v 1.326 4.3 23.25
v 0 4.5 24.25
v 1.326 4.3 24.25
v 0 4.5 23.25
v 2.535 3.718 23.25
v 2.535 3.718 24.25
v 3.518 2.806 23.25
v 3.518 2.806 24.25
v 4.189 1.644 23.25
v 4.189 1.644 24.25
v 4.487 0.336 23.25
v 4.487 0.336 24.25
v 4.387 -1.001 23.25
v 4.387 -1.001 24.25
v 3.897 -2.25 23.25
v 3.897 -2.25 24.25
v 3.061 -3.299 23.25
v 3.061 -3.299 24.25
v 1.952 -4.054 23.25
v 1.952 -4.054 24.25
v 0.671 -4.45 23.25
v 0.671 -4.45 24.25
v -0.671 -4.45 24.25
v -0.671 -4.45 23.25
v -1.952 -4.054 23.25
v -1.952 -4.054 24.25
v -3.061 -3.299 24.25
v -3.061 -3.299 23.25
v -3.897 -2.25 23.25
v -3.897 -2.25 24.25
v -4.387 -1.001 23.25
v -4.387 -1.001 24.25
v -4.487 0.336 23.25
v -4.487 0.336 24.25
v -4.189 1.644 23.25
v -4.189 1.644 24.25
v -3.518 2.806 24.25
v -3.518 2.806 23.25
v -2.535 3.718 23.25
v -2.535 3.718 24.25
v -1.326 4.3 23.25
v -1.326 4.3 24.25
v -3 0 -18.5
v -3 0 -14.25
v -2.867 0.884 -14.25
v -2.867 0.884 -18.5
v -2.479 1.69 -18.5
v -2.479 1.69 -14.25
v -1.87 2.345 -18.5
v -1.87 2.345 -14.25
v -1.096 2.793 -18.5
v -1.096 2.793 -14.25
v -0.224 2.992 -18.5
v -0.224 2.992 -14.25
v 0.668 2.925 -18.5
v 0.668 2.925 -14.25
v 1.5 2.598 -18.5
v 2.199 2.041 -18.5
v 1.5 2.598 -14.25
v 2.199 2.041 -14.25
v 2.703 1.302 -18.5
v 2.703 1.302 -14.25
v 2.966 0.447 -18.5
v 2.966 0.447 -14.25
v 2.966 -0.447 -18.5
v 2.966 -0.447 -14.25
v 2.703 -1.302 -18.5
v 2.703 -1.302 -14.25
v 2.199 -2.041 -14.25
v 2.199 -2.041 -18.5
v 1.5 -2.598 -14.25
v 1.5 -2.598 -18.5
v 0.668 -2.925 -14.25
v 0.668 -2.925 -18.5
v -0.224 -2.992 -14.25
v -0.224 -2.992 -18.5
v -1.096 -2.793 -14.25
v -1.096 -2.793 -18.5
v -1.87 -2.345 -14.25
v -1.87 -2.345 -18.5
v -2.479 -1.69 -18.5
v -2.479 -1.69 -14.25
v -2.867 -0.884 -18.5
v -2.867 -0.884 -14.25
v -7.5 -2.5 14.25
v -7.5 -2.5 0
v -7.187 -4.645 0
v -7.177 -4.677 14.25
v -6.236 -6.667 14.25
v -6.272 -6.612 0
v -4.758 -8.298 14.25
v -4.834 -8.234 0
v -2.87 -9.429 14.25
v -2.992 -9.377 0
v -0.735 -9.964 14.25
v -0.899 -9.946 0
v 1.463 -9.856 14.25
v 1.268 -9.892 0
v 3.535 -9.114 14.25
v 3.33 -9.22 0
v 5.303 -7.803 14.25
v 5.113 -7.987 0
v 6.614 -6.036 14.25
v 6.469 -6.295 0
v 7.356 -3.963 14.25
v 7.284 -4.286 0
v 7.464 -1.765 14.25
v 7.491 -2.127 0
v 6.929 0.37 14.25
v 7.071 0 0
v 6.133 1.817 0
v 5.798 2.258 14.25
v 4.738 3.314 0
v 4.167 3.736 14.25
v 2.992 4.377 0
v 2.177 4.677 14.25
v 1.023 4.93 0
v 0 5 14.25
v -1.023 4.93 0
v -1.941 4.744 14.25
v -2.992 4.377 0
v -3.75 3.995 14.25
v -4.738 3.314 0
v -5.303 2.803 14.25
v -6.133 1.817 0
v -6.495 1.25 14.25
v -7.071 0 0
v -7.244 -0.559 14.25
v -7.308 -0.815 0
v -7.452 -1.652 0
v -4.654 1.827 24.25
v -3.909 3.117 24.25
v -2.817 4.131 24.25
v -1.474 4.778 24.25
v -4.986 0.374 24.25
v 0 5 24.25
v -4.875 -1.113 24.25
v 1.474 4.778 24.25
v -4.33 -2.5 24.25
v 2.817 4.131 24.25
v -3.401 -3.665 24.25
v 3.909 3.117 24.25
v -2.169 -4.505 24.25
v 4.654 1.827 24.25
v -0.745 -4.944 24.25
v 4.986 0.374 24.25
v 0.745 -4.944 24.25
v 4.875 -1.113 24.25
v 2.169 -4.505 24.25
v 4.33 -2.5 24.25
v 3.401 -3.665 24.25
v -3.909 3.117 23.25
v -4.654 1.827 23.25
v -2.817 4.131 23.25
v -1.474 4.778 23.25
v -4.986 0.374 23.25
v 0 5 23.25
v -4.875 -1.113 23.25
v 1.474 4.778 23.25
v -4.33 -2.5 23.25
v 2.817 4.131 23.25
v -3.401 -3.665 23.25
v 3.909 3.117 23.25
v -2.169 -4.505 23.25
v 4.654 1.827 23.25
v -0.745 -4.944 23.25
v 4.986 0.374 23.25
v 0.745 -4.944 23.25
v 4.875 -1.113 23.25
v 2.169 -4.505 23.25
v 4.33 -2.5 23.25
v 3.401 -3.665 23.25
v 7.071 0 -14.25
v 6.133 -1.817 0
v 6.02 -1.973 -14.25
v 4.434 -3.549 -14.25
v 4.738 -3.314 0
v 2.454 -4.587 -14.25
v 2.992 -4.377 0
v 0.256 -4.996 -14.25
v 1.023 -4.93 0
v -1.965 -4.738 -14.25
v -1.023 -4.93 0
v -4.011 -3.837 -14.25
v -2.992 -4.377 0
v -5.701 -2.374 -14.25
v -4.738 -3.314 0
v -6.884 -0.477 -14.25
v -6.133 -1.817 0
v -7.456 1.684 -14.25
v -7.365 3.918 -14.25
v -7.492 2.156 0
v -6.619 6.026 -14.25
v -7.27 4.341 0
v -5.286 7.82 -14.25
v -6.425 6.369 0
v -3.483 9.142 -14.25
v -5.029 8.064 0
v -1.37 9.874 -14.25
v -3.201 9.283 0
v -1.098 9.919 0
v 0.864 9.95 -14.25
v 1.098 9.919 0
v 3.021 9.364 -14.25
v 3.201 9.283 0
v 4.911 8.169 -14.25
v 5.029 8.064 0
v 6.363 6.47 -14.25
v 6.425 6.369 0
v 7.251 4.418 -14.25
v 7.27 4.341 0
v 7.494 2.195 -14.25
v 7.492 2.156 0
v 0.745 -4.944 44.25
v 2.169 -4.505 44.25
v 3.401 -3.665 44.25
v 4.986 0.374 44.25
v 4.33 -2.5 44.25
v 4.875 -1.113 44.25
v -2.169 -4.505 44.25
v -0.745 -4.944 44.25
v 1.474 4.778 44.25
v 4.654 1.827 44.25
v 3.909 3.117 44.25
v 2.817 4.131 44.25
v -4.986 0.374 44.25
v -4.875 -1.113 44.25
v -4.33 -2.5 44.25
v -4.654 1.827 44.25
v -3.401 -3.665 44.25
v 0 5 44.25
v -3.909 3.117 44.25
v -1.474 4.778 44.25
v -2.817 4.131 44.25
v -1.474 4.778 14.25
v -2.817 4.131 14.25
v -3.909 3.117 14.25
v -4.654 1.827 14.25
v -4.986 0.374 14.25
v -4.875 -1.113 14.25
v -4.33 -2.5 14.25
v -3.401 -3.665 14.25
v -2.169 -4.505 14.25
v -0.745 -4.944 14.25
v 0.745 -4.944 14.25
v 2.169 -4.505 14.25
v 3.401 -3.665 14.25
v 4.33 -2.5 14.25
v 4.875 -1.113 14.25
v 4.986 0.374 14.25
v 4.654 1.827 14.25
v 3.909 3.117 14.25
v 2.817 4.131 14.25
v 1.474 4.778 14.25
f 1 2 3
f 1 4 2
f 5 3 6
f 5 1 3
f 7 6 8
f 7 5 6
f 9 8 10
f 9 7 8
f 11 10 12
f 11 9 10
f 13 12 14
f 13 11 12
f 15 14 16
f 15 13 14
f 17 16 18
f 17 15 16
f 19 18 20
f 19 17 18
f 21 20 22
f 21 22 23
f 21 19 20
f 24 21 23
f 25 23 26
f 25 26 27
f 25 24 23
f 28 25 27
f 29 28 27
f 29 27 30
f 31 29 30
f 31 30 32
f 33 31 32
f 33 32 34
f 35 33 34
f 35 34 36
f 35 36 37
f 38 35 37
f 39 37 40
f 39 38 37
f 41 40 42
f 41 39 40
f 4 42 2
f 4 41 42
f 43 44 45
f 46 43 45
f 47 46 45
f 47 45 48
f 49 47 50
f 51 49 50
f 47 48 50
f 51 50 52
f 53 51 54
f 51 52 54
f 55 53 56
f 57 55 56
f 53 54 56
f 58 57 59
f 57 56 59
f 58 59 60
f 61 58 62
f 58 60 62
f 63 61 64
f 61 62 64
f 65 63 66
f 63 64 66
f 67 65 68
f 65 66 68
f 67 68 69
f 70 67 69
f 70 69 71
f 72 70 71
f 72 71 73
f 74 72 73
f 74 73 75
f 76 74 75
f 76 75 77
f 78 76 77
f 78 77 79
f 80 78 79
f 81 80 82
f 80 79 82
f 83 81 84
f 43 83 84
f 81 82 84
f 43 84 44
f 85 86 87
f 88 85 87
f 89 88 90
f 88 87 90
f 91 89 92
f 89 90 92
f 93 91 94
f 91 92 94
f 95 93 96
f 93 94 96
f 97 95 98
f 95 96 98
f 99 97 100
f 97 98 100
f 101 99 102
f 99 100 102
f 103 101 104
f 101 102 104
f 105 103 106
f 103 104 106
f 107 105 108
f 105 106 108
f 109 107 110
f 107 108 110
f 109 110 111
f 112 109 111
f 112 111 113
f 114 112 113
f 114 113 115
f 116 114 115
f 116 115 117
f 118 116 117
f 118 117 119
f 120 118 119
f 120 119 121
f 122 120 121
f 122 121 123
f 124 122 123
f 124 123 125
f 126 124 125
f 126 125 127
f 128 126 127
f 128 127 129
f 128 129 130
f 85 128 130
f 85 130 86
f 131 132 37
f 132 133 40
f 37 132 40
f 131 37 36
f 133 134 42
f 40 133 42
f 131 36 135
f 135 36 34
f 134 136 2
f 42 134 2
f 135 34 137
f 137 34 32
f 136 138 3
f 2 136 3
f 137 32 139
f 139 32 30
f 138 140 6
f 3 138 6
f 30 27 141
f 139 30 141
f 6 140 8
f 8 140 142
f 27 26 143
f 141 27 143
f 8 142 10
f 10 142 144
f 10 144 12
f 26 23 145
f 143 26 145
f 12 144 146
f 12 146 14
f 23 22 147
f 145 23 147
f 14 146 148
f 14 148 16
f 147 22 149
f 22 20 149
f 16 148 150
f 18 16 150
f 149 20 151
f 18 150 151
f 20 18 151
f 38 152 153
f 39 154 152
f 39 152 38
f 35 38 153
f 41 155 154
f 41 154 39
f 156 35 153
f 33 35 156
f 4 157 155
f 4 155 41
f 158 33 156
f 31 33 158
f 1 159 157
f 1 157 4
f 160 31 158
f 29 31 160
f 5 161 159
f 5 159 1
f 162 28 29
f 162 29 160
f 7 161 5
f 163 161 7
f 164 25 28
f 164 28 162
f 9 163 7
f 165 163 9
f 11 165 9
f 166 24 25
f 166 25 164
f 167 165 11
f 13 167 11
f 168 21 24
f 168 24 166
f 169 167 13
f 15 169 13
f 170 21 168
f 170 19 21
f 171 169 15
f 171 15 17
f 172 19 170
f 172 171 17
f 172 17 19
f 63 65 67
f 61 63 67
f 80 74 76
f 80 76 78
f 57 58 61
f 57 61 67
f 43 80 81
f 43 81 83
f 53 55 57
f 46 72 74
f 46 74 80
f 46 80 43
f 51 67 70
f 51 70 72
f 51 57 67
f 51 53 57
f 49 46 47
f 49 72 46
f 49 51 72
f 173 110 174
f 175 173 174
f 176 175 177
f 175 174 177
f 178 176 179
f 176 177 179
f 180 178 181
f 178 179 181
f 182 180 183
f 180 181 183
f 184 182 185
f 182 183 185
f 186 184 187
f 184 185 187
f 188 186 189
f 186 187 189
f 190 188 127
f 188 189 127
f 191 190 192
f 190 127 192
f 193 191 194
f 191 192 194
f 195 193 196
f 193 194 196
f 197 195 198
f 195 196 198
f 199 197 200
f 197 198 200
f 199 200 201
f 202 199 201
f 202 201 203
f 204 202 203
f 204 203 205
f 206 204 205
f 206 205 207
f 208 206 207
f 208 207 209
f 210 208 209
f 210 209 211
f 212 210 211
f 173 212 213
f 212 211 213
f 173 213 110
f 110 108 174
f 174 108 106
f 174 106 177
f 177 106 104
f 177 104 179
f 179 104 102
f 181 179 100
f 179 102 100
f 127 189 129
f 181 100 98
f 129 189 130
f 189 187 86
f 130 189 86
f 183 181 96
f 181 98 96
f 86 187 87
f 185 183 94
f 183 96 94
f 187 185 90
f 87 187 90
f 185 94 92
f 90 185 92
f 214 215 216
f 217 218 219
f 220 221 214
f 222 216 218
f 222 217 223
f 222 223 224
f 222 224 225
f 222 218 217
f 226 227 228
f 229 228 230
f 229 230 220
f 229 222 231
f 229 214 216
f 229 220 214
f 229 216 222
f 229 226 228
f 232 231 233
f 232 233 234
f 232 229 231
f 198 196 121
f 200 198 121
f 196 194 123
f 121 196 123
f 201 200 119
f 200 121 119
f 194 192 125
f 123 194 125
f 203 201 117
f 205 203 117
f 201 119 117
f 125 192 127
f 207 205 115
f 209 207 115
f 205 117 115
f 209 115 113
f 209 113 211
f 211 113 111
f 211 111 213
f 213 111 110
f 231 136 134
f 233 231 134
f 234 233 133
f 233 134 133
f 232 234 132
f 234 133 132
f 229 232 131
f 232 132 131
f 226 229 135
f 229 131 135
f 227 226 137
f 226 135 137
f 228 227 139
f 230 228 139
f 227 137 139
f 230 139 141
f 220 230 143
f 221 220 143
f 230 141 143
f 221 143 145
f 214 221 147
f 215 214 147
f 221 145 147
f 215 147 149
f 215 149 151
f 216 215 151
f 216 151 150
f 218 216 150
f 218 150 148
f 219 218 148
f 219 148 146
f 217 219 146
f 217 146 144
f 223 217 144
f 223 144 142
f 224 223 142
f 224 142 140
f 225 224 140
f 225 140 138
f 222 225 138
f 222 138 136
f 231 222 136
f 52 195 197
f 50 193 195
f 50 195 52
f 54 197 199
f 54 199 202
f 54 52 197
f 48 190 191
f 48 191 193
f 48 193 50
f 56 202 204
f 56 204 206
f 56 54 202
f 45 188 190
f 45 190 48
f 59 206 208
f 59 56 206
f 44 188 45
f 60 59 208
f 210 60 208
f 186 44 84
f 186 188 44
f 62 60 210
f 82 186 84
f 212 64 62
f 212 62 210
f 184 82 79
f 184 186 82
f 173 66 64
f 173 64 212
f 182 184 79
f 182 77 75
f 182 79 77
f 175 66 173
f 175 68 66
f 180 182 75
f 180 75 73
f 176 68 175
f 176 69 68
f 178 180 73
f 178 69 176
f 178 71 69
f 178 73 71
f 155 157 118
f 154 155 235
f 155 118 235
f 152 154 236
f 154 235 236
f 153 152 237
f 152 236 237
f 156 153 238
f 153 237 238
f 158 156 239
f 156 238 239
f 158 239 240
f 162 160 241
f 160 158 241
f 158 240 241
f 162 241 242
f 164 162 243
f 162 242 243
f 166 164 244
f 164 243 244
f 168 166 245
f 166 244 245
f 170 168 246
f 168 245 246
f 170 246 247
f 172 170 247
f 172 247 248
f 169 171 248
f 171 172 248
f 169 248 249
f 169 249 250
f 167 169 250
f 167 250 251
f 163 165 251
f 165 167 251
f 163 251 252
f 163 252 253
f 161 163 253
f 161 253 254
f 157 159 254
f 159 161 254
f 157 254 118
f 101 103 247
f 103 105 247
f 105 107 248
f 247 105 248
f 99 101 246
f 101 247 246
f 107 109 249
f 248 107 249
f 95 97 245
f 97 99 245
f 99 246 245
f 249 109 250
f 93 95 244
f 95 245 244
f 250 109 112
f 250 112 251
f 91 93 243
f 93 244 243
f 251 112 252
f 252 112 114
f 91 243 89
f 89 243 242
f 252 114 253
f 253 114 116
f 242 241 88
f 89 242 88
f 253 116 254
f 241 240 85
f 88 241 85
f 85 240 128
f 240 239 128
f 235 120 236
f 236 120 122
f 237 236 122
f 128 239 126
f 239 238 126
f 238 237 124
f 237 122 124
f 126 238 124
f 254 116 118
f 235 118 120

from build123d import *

# Parameters (mm, degrees)
SKETCH1_R           = 7.5
BOSS_EXTRUDE1_DEPTH = 14.25
SKETCH2_R           = 7.5
BOSS_EXTRUDE2_DEPTH = 14.25
SKETCH3_R           = 3
CUT_EXTRUDE1_DEPTH  = 32.120732639
SKETCH4_R           = 3
BOSS_EXTRUDE3_DEPTH = 4.25
SKETCH4_2_R         = 3
BOSS_EXTRUDE4_DEPTH = 28.5
SKETCH5_R           = 5
BOSS_EXTRUDE5_DEPTH = 30
SKETCH7_W           = 1
SKETCH7_H           = 2.291482858


with BuildPart() as part:
    # Sketch1 → Boss-Extrude1 (new body)
    with BuildSketch(Plane.XY):
        with Locations(Location((0, -2.5, 0), (0, 0, 180))):
            Circle(SKETCH1_R)
    extrude(amount=BOSS_EXTRUDE1_DEPTH)

    # Sketch2 → Boss-Extrude2 (add)
    with BuildSketch(Plane(origin=(0, 0, 0), x_dir=(-1, 0, 0), z_dir=(0, 0, -1))):
        with Locations(Location((0, 2.5, 0), (0, 0, 199.471220634))):
            Circle(SKETCH2_R)
    extrude(amount=BOSS_EXTRUDE2_DEPTH)

    # Sketch3 → Cut-Extrude1 (cut, through all)
    with BuildSketch(Plane(origin=(0, 0, -14.25), x_dir=(-1, 0, 0), z_dir=(0, 0, -1))):
        Circle(SKETCH3_R)
    extrude(amount=-CUT_EXTRUDE1_DEPTH, mode=Mode.SUBTRACT)



with BuildPart() as body_2:
    # Sketch4 → Boss-Extrude3 (new body)
    with BuildSketch(Plane(origin=(0, 0, -14.25), x_dir=(-1, 0, 0), z_dir=(0, 0, -1))):
        Circle(SKETCH4_R)
    extrude(amount=BOSS_EXTRUDE3_DEPTH)


with BuildPart() as part_1:
    add(part.part)

    add(body_2.part)  # Boss-Extrude4 merges body 2
    # Sketch4<2> → Boss-Extrude4 (add)
    with BuildSketch(Plane(origin=(0, 0, -14.25), x_dir=(-1, 0, 0), z_dir=(0, 0, -1))):
        Circle(SKETCH4_2_R)
    extrude(amount=-BOSS_EXTRUDE4_DEPTH)

    # Sketch5 → Boss-Extrude5 (add)
    with BuildSketch(Plane.XY.offset(14.25)):
        with Locations(Location((0, 0, 0), (0, 0, 89.999372356))):
            Circle(SKETCH5_R)
    extrude(amount=BOSS_EXTRUDE5_DEPTH)

    # Sketch7 → Cut-Revolve1 (revolve, cut)
    with BuildSketch(Plane(origin=(0, 0, 0), x_dir=(0, 0, -1), z_dir=(1, 0, 0))):
        with Locations((-23.75, 5.645741429)):
            Rectangle(SKETCH7_W, SKETCH7_H)
    revolve(axis=Axis((0, 0, 44.25), (0, 0, -1)), mode=Mode.SUBTRACT)


solid = part_1.part
